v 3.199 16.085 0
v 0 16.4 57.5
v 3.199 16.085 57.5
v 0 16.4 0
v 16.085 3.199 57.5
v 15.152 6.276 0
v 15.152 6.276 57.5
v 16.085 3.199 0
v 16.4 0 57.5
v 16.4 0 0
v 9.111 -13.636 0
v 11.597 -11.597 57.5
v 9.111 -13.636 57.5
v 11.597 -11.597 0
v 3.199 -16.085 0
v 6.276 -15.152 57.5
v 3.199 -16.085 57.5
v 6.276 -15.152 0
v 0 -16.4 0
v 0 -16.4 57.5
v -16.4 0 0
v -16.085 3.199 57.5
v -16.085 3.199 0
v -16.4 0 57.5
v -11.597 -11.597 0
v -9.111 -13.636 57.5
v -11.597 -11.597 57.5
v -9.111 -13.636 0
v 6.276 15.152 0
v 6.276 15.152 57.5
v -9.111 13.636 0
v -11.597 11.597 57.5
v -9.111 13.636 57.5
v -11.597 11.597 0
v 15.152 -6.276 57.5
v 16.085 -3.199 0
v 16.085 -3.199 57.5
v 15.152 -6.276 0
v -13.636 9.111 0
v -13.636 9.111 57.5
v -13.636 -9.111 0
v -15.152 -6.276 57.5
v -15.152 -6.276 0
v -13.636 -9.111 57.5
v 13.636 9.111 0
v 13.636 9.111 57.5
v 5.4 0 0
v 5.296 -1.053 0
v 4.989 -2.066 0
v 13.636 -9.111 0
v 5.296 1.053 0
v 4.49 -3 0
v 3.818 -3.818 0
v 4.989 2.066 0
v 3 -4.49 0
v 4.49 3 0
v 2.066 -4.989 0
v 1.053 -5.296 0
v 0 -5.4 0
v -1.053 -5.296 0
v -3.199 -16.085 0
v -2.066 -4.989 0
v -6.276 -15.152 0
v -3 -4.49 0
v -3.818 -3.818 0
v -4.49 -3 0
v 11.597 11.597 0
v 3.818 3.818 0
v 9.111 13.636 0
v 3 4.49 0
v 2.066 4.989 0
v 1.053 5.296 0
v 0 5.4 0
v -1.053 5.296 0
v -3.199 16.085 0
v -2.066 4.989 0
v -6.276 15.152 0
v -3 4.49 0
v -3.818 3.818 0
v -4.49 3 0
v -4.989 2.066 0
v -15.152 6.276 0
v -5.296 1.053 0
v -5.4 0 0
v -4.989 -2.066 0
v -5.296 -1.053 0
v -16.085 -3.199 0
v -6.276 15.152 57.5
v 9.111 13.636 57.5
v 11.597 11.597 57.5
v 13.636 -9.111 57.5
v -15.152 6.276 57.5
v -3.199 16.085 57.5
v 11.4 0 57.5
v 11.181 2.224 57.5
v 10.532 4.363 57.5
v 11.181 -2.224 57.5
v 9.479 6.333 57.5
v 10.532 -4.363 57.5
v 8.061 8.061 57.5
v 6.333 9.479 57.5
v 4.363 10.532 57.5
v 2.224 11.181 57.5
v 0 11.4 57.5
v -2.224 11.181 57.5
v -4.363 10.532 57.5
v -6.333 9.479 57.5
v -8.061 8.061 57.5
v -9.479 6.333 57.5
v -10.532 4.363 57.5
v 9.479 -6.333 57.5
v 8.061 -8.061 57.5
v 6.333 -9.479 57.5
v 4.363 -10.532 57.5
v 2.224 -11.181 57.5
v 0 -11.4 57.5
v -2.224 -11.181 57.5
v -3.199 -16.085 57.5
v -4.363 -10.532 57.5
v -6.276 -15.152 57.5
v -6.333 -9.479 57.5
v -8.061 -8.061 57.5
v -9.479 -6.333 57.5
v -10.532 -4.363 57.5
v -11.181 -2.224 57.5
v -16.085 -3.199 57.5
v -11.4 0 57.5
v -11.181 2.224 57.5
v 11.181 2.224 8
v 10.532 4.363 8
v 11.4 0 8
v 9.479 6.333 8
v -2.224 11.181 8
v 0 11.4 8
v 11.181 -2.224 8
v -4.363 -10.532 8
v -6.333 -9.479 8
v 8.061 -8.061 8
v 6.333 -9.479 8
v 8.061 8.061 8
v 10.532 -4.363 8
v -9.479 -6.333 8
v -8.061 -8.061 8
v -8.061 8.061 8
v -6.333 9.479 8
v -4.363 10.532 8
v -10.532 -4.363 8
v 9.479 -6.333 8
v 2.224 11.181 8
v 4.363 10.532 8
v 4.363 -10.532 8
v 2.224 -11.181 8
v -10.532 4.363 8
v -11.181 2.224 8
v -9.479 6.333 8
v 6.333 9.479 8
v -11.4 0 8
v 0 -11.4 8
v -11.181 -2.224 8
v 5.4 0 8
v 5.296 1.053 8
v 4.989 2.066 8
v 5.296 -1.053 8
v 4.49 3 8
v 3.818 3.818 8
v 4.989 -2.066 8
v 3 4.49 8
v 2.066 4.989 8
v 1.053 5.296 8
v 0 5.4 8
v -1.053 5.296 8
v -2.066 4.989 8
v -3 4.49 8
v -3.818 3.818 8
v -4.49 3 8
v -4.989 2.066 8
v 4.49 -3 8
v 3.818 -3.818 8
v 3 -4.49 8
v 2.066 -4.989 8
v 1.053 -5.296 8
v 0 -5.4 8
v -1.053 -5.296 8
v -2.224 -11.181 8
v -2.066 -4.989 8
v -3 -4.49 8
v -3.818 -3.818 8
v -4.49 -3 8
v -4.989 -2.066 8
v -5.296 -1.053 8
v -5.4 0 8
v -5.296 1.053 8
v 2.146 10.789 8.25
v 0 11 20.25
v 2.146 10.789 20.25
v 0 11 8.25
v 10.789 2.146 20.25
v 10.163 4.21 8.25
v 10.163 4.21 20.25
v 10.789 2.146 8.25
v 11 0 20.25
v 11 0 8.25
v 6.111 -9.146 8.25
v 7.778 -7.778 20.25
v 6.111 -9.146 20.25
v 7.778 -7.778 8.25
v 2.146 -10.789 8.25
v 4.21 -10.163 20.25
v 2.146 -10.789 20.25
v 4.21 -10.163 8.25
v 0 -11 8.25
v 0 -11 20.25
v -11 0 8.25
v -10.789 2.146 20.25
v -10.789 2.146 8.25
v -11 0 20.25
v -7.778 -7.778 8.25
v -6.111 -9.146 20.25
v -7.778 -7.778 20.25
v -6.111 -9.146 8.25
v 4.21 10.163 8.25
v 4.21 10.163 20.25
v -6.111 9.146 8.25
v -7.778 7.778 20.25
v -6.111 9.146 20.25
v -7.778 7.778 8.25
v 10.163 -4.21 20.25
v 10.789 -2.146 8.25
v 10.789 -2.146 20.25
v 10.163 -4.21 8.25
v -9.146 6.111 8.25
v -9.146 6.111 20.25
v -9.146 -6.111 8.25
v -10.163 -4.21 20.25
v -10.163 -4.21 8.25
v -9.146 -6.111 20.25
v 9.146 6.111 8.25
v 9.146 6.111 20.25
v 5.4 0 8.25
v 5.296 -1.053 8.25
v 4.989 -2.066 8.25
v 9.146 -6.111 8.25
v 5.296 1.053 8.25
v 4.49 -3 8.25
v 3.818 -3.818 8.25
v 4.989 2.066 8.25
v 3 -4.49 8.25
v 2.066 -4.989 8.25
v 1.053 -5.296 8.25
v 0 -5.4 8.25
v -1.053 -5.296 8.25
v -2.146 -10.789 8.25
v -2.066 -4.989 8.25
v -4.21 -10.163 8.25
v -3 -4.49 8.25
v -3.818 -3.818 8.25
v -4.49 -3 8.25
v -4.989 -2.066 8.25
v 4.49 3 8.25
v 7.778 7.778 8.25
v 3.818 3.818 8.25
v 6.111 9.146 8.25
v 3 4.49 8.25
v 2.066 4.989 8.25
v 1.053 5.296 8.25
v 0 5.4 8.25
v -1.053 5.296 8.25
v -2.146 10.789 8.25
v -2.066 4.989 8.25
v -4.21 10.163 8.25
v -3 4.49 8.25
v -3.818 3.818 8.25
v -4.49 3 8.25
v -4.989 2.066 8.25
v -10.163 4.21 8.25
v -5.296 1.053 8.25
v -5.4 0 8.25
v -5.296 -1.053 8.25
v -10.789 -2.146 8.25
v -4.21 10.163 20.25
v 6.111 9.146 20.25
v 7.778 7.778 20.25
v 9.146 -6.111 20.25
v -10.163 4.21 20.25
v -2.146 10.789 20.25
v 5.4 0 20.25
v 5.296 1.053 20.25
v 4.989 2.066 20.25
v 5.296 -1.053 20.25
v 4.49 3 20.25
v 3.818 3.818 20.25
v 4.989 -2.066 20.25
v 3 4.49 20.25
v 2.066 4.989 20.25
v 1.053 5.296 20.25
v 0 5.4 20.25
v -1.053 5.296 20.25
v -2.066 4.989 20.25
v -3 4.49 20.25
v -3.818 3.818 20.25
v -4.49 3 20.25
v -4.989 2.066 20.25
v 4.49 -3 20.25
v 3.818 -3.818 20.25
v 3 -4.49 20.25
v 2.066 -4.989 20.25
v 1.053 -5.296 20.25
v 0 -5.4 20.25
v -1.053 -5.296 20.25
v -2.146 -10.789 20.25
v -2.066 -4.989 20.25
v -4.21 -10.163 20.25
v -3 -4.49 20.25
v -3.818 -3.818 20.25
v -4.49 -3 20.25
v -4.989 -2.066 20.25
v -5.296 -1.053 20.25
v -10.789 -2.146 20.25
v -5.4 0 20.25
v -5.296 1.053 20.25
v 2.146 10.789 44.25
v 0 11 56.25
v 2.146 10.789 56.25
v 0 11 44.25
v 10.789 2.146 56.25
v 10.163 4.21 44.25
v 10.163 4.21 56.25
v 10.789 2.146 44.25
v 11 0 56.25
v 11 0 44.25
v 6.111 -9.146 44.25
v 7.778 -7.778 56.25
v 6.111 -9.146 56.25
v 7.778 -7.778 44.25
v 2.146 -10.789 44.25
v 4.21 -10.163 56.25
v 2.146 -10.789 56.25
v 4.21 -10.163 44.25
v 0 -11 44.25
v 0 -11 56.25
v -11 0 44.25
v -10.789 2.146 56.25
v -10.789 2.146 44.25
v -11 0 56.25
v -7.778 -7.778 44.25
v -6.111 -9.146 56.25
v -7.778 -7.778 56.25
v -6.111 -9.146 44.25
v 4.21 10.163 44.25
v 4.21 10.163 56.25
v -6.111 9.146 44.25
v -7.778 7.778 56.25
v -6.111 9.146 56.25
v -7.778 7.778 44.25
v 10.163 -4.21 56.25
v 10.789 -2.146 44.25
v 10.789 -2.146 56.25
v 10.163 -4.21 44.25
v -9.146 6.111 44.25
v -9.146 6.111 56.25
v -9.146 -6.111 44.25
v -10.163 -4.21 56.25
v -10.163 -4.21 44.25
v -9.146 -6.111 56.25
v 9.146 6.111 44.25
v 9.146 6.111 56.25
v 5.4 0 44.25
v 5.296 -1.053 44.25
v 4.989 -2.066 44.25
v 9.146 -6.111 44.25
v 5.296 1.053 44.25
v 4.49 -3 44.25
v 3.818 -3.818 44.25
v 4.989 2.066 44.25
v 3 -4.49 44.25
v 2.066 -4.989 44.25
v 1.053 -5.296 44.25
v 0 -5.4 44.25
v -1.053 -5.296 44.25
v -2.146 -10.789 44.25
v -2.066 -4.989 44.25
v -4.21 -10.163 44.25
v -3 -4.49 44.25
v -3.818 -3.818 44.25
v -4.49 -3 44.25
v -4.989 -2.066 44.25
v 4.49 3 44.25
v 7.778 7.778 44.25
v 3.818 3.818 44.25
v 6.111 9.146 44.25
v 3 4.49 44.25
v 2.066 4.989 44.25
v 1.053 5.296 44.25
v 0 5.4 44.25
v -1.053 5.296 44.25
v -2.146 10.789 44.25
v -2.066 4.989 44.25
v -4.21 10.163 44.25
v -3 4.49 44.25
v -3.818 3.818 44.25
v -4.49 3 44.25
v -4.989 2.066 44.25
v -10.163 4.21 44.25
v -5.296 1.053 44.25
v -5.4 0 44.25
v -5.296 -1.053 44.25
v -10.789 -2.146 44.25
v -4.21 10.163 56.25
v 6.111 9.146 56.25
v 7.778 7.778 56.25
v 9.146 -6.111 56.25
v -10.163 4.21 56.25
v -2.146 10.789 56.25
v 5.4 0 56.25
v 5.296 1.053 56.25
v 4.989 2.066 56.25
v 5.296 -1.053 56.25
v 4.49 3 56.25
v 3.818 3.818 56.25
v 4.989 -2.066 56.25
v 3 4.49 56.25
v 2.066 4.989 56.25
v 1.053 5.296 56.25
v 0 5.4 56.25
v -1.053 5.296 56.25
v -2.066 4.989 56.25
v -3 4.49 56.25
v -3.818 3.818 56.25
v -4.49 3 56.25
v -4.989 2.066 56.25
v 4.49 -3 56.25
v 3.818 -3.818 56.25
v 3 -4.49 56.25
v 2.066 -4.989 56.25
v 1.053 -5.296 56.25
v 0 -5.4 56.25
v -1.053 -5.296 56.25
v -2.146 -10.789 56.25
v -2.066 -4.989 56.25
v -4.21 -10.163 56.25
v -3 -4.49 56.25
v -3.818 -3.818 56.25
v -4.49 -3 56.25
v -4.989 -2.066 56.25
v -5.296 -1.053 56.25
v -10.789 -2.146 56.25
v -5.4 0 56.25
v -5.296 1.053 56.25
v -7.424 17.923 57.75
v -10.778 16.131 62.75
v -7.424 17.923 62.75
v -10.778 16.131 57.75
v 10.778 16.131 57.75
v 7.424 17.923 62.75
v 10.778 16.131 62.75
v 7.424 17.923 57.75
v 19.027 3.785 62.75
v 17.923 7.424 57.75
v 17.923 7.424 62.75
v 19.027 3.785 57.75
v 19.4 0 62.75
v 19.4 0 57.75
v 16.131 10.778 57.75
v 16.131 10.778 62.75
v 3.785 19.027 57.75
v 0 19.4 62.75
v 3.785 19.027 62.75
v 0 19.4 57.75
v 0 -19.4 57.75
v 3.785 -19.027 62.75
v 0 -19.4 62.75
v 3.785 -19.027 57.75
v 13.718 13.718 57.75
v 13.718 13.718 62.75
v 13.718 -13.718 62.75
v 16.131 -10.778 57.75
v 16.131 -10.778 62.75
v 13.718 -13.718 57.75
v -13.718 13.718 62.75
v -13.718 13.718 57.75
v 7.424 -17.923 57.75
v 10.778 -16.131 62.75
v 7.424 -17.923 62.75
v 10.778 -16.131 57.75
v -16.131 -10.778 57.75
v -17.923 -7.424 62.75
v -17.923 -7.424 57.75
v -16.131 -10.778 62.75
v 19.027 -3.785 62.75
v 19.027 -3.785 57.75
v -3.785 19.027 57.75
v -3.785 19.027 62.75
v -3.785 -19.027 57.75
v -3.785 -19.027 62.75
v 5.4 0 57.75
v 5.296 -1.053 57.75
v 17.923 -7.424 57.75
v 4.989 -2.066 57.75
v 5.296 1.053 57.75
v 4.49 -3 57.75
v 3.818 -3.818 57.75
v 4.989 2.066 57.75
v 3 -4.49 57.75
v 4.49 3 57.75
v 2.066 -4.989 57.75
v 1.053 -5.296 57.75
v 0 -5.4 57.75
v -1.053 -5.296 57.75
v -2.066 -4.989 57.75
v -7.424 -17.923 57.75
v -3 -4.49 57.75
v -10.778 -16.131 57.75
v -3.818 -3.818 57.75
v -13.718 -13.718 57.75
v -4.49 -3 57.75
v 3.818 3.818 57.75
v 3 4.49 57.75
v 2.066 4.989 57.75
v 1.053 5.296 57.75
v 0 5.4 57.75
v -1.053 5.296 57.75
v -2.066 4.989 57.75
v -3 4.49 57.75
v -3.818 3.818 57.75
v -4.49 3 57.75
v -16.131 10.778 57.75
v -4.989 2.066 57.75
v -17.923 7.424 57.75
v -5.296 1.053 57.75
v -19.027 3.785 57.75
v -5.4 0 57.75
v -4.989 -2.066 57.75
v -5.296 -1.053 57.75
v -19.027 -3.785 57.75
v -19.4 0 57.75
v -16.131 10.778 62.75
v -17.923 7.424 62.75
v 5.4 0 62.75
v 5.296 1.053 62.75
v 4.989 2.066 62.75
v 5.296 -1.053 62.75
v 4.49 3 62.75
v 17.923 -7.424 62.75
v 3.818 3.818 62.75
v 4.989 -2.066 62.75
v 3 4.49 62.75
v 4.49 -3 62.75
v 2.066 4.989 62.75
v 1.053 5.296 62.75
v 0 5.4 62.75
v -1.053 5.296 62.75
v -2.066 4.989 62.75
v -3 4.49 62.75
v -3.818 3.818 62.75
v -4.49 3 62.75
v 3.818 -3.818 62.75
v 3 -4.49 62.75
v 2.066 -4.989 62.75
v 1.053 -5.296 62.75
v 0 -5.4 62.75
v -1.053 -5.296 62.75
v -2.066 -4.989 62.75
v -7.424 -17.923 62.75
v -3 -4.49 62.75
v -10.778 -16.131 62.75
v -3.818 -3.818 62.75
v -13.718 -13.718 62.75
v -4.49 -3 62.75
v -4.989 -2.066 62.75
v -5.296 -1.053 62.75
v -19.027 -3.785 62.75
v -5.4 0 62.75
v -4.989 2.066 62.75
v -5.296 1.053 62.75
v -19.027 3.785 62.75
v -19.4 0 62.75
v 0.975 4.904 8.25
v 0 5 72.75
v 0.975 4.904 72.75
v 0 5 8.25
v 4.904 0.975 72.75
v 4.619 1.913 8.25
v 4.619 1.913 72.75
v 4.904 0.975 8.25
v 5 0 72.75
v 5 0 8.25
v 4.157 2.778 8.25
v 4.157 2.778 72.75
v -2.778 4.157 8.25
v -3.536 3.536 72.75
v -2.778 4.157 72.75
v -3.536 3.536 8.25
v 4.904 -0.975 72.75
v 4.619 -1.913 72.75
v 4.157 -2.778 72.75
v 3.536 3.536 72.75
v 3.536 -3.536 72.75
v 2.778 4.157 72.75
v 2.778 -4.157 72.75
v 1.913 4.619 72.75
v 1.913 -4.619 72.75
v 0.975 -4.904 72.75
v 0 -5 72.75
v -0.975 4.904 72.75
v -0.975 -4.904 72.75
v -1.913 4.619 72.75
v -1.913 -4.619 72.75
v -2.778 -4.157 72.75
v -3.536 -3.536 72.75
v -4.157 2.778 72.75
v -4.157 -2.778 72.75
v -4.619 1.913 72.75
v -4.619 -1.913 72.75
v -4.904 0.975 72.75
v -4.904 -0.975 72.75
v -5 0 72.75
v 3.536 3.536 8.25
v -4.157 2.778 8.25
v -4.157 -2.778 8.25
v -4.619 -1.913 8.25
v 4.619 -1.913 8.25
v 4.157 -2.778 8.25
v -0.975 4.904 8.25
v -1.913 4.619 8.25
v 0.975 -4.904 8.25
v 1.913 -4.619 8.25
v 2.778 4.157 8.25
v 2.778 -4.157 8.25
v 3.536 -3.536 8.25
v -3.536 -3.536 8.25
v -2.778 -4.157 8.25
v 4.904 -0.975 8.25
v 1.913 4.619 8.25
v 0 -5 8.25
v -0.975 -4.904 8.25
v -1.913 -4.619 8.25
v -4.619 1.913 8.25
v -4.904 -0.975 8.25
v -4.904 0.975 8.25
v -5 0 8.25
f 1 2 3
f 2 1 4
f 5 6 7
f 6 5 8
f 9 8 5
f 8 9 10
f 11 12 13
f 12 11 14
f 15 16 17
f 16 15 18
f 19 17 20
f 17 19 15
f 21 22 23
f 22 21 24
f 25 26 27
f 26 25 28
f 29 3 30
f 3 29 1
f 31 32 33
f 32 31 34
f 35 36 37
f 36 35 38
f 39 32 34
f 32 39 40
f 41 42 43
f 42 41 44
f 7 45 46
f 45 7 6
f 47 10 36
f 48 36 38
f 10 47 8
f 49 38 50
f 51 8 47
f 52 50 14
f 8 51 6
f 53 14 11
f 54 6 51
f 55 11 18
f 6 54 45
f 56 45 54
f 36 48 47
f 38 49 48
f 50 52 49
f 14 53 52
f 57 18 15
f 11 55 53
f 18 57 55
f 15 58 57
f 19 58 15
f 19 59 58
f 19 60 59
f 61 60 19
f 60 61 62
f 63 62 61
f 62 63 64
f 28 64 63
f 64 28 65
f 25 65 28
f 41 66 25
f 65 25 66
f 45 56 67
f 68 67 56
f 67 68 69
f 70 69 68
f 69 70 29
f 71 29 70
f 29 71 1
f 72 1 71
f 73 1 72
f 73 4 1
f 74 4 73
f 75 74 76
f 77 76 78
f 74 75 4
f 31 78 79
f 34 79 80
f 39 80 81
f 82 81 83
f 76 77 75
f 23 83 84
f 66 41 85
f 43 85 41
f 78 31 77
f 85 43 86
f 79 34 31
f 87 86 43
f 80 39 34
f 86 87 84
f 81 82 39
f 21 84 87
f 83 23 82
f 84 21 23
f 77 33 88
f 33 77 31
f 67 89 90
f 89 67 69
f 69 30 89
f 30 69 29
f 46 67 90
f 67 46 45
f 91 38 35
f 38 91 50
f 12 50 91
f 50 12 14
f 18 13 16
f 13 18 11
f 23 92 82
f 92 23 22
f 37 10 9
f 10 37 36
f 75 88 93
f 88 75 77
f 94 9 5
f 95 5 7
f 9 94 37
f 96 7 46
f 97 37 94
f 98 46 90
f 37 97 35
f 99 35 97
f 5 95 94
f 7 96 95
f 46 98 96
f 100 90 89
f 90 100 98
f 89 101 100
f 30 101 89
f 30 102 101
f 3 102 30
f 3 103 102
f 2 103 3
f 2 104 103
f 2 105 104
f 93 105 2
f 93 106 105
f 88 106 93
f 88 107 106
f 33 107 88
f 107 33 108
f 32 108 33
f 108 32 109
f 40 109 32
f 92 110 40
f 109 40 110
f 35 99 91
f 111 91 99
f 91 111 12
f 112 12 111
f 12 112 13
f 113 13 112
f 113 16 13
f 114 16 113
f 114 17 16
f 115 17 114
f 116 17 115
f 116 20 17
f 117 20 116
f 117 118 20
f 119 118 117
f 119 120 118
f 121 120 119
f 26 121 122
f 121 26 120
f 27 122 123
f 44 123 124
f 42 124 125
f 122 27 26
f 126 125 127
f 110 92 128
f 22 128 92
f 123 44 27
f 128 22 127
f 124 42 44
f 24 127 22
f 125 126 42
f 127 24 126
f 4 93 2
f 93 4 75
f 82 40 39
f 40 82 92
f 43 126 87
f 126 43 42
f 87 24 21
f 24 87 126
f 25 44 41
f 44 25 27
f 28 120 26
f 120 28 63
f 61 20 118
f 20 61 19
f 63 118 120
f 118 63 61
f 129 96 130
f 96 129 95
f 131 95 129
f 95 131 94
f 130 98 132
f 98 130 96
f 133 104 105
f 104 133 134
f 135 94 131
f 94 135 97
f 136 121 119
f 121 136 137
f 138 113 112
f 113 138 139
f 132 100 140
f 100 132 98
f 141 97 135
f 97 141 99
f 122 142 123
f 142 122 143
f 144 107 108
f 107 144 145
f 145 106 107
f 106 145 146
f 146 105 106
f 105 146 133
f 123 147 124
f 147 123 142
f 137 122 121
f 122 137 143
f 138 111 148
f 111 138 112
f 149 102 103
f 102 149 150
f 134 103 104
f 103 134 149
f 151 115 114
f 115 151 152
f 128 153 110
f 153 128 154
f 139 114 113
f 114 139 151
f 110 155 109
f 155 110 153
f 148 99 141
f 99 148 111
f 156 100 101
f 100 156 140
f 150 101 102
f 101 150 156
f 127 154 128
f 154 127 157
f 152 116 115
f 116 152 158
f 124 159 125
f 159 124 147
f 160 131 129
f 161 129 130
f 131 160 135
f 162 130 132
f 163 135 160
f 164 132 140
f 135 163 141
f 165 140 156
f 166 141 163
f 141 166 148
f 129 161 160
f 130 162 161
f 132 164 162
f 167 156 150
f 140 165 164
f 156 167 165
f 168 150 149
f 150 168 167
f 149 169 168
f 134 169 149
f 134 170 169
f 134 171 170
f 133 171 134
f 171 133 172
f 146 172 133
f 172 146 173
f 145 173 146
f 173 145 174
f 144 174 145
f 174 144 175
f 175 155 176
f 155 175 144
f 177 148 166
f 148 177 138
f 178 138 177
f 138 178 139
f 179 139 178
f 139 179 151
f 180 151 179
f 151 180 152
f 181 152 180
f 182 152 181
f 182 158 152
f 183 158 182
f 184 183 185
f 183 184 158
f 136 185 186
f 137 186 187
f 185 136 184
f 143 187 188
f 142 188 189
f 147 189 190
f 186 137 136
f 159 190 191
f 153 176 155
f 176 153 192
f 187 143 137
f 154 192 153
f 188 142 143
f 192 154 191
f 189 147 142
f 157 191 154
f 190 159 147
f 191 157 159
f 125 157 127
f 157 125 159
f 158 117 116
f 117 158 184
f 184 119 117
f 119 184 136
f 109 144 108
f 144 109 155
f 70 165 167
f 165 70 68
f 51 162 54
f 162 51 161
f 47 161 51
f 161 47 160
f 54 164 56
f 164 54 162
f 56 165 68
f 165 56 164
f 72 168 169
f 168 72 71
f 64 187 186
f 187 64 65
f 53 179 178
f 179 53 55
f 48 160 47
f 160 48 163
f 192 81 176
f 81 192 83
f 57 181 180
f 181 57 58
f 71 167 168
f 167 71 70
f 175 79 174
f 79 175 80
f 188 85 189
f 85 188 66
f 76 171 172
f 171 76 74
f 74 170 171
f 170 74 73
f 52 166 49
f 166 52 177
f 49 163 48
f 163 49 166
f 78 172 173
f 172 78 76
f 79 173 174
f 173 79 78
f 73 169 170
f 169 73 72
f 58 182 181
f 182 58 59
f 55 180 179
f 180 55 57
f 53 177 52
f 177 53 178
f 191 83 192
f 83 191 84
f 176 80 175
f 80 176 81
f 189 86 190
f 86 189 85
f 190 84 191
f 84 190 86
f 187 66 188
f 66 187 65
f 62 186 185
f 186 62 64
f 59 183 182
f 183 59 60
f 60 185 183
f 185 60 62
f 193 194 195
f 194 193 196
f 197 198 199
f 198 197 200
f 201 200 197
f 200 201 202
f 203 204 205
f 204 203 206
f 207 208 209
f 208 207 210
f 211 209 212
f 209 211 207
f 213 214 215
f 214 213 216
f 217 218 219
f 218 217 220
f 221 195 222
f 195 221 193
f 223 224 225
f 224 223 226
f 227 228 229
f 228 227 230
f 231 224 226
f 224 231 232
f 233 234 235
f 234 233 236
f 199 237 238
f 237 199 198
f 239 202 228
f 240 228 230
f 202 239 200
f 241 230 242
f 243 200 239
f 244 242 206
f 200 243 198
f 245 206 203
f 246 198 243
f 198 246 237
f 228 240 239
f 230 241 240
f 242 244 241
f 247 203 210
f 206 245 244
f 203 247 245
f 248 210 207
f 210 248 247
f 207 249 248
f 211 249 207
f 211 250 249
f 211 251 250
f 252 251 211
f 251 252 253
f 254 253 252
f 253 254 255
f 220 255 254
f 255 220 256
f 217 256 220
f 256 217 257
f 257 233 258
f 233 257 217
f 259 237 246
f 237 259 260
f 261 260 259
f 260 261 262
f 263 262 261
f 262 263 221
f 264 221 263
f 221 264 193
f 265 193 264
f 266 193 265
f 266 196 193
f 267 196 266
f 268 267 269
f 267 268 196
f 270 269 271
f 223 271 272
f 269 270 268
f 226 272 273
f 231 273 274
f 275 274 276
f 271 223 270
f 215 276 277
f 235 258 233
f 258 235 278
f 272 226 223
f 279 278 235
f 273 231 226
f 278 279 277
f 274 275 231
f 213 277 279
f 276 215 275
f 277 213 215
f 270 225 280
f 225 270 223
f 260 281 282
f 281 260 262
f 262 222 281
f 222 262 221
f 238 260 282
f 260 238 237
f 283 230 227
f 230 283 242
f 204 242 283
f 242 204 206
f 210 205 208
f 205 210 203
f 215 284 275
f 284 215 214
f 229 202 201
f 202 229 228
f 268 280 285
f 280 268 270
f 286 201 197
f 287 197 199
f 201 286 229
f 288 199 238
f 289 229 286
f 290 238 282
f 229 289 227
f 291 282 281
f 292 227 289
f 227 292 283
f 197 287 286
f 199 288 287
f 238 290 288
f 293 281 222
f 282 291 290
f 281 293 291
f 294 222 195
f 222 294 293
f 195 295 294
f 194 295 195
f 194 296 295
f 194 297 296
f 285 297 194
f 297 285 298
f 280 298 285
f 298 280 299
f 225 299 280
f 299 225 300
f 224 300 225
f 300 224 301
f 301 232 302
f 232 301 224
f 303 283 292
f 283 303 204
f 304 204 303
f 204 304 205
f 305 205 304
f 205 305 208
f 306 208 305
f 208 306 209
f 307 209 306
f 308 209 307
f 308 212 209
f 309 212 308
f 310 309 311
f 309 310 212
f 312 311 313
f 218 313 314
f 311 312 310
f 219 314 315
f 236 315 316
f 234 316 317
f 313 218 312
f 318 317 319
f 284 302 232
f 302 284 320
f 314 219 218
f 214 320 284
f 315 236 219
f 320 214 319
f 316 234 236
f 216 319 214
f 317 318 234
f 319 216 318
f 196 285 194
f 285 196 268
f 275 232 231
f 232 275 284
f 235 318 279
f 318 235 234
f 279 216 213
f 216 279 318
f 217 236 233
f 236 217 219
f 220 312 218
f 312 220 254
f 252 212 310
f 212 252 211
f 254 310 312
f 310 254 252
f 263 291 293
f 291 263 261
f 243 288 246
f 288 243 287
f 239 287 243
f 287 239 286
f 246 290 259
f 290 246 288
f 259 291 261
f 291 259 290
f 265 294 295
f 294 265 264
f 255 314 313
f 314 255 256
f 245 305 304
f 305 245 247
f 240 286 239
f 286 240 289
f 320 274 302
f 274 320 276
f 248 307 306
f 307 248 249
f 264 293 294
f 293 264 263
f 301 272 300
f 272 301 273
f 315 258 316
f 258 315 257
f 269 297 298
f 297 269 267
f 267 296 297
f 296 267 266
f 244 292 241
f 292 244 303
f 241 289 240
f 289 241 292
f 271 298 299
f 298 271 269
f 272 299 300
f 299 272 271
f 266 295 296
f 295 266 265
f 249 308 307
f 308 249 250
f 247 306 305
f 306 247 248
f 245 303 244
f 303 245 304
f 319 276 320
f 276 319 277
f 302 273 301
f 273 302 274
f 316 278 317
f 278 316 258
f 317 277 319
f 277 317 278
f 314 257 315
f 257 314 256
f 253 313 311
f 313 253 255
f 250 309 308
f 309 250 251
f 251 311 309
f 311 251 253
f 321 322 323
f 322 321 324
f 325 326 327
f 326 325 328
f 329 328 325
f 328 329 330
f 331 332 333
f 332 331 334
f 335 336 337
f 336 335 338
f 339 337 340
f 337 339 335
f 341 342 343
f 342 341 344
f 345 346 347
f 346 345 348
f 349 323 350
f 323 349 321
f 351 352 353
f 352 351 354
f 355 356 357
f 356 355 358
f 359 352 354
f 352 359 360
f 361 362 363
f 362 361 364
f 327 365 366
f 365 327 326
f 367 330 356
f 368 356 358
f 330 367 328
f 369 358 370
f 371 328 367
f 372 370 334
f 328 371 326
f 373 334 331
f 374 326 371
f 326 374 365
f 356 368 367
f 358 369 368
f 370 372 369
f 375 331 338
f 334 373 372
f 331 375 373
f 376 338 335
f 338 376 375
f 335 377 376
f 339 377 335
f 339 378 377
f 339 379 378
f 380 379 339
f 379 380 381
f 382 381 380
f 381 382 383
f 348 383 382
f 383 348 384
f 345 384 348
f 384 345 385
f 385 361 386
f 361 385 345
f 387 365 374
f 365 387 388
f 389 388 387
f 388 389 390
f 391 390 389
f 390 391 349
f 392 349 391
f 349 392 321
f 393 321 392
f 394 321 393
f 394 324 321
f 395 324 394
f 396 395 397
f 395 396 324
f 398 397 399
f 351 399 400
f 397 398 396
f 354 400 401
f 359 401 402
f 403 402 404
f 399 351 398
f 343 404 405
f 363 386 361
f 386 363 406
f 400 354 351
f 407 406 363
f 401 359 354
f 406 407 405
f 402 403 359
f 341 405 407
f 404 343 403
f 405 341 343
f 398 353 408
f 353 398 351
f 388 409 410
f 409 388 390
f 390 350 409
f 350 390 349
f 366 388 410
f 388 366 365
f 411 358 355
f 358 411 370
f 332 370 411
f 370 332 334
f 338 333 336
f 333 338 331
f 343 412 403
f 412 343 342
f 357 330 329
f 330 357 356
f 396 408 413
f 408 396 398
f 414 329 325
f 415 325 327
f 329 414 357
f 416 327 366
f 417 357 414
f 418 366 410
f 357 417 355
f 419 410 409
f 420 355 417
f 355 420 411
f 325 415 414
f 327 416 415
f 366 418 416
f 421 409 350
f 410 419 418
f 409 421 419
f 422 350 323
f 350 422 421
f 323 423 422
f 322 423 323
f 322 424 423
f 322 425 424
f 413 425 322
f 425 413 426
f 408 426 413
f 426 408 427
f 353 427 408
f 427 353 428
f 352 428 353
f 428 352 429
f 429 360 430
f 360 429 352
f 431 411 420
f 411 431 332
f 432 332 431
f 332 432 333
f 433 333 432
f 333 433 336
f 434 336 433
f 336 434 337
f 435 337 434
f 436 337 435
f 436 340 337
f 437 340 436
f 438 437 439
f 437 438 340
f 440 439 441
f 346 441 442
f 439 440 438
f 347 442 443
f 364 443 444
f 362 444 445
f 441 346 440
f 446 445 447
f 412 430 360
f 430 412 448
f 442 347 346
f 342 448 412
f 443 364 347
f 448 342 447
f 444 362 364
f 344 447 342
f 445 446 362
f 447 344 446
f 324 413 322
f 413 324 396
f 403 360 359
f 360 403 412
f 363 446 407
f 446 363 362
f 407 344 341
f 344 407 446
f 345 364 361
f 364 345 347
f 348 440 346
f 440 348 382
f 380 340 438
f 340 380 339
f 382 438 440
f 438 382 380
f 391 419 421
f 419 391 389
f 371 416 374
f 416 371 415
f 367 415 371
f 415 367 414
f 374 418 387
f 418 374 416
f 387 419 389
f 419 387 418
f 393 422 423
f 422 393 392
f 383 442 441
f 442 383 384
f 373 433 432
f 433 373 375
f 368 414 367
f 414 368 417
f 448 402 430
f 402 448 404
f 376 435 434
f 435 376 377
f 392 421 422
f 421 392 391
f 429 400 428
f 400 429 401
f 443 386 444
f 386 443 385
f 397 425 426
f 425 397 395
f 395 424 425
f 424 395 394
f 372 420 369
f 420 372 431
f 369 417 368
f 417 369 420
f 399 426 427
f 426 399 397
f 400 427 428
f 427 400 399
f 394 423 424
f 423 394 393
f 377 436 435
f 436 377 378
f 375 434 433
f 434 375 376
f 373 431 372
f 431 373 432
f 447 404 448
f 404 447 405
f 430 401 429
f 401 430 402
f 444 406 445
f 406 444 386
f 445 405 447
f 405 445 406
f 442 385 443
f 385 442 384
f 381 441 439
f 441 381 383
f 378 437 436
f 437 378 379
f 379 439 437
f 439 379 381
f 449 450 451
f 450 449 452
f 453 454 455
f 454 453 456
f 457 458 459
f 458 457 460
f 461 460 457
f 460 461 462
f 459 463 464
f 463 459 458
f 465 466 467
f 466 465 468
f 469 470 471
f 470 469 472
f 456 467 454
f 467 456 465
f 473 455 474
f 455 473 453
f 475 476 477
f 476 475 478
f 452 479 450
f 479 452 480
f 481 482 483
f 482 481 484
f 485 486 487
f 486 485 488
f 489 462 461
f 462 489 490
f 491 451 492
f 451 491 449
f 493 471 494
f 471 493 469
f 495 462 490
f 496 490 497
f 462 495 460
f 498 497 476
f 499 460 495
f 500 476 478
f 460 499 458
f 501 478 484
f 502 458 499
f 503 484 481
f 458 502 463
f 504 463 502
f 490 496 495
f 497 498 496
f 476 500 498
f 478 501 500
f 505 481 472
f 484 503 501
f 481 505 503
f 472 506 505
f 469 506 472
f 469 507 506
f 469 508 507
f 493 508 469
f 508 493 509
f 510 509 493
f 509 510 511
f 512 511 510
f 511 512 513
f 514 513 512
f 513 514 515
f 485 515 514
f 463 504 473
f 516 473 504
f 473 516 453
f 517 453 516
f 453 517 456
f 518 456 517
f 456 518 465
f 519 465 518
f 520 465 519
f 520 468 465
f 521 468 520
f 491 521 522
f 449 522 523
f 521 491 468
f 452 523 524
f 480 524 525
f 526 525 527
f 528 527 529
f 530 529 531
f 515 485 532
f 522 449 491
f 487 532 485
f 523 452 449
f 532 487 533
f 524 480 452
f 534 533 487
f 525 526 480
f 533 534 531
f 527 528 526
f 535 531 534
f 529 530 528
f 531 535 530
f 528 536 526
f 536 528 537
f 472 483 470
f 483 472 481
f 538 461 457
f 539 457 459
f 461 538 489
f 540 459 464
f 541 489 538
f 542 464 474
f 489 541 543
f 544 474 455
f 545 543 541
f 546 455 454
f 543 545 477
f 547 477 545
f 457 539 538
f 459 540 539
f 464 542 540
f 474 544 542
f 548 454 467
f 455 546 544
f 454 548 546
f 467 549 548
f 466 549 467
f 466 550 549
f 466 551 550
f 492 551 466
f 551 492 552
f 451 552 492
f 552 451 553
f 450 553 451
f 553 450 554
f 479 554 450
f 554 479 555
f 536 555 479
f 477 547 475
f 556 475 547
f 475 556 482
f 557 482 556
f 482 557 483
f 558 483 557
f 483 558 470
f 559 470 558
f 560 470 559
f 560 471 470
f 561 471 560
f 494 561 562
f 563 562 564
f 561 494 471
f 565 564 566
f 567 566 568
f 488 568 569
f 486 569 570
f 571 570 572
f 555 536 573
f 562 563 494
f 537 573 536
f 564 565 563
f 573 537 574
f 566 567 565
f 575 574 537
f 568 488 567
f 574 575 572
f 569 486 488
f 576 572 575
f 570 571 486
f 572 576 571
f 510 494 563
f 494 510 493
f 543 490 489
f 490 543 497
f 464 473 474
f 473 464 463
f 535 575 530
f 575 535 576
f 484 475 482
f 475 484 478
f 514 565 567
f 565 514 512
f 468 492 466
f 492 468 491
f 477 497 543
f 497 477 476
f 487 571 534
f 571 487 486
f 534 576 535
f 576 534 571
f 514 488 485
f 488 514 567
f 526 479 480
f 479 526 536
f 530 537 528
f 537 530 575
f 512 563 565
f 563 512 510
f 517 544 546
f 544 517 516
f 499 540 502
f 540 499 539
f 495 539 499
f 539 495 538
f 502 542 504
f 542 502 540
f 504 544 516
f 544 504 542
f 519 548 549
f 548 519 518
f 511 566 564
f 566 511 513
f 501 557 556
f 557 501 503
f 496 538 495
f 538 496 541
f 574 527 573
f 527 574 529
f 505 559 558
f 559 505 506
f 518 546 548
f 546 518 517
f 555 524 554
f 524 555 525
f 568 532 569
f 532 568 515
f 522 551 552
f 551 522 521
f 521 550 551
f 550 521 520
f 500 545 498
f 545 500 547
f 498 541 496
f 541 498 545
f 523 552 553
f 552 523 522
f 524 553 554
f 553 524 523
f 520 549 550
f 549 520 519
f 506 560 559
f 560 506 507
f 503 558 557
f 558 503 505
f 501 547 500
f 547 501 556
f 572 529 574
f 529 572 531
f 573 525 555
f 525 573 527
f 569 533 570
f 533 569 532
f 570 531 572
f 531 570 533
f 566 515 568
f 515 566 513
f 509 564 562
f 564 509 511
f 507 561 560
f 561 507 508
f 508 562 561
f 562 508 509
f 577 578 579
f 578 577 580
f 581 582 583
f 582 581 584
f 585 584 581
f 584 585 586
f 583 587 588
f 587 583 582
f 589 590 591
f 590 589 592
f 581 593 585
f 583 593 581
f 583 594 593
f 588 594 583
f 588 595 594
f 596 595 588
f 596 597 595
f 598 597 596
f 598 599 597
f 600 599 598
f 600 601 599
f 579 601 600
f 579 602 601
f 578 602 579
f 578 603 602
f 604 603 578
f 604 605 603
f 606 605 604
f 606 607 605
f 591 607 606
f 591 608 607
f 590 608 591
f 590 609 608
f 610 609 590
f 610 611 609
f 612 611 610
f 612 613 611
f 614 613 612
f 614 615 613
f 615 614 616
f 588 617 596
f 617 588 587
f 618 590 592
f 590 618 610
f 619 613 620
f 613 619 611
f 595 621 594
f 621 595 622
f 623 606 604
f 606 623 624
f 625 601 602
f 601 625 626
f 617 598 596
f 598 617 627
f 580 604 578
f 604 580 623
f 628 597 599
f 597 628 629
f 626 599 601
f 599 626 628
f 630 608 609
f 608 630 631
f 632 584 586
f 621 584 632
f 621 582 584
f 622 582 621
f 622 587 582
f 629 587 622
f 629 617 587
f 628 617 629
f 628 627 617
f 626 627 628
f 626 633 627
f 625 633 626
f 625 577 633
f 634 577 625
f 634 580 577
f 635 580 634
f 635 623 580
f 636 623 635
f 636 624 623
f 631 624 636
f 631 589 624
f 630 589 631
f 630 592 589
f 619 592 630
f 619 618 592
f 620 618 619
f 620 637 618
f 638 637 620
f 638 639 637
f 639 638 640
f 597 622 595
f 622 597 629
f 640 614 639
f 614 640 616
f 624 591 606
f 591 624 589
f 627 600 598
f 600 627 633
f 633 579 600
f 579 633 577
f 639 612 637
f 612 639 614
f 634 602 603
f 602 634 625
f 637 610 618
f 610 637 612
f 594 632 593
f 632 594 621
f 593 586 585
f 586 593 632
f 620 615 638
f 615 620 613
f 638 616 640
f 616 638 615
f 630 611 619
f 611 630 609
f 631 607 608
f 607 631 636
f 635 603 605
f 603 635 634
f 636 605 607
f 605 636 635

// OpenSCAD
$fn = 32;

// ------------------------------------------------------------------------
// Shaft station: cup d32.8 x 57.5 mm, shaft d10
// Every part is its own module, assembly() places every instance.
// ------------------------------------------------------------------------

// --- part 1 ---
module housing_cup() {
  difference() {
    cylinder(h = 57.5, d = 32.8);
    translate([0, 0, 8]) cylinder(h = 50.5, d = 22.8);
    translate([0, 0, -1]) cylinder(h = 10, d = 10.8);
  }
}

// --- part 2 ---
module bearing_lower() {
  difference() {
      translate([0, 0, 0]) cylinder(h = 12, d = 22);
      translate([0, 0, -1]) cylinder(h = 14, d = 10.8);
    }
}

// --- part 3 ---
module bearing_upper() {
  difference() {
      translate([0, 0, 0]) cylinder(h = 12, d = 22);
      translate([0, 0, -1]) cylinder(h = 14, d = 10.8);
    }
}

// --- part 4 ---
module station_shaft() {
  translate([0, 0, -32.25]) cylinder(h = 64.5, d = 10);
}

// --- part 5 ---
module station_cover() {
  difference() {
    cylinder(h = 5, d = 38.8);
    translate([0, 0, -1]) cylinder(h = 7, d = 10.8);
  }
}

// --- assembly ---
module assembly() {
  color([0.80, 0.24, 0.20]) translate([0, 0, 0]) rotate([0, 0, 0]) housing_cup();
  color([0.20, 0.45, 0.75]) translate([0, 0, 8.25]) rotate([0, 0, 0]) bearing_lower();
  color([0.25, 0.62, 0.32]) translate([0, 0, 44.25]) rotate([0, 0, 0]) bearing_upper();
  color([0.92, 0.70, 0.18]) translate([0, 0, 40.5]) rotate([0, 0, 0]) station_shaft();
  color([0.58, 0.35, 0.70]) translate([0, 0, 57.75]) rotate([0, 0, 0]) station_cover();
}

assembly();
